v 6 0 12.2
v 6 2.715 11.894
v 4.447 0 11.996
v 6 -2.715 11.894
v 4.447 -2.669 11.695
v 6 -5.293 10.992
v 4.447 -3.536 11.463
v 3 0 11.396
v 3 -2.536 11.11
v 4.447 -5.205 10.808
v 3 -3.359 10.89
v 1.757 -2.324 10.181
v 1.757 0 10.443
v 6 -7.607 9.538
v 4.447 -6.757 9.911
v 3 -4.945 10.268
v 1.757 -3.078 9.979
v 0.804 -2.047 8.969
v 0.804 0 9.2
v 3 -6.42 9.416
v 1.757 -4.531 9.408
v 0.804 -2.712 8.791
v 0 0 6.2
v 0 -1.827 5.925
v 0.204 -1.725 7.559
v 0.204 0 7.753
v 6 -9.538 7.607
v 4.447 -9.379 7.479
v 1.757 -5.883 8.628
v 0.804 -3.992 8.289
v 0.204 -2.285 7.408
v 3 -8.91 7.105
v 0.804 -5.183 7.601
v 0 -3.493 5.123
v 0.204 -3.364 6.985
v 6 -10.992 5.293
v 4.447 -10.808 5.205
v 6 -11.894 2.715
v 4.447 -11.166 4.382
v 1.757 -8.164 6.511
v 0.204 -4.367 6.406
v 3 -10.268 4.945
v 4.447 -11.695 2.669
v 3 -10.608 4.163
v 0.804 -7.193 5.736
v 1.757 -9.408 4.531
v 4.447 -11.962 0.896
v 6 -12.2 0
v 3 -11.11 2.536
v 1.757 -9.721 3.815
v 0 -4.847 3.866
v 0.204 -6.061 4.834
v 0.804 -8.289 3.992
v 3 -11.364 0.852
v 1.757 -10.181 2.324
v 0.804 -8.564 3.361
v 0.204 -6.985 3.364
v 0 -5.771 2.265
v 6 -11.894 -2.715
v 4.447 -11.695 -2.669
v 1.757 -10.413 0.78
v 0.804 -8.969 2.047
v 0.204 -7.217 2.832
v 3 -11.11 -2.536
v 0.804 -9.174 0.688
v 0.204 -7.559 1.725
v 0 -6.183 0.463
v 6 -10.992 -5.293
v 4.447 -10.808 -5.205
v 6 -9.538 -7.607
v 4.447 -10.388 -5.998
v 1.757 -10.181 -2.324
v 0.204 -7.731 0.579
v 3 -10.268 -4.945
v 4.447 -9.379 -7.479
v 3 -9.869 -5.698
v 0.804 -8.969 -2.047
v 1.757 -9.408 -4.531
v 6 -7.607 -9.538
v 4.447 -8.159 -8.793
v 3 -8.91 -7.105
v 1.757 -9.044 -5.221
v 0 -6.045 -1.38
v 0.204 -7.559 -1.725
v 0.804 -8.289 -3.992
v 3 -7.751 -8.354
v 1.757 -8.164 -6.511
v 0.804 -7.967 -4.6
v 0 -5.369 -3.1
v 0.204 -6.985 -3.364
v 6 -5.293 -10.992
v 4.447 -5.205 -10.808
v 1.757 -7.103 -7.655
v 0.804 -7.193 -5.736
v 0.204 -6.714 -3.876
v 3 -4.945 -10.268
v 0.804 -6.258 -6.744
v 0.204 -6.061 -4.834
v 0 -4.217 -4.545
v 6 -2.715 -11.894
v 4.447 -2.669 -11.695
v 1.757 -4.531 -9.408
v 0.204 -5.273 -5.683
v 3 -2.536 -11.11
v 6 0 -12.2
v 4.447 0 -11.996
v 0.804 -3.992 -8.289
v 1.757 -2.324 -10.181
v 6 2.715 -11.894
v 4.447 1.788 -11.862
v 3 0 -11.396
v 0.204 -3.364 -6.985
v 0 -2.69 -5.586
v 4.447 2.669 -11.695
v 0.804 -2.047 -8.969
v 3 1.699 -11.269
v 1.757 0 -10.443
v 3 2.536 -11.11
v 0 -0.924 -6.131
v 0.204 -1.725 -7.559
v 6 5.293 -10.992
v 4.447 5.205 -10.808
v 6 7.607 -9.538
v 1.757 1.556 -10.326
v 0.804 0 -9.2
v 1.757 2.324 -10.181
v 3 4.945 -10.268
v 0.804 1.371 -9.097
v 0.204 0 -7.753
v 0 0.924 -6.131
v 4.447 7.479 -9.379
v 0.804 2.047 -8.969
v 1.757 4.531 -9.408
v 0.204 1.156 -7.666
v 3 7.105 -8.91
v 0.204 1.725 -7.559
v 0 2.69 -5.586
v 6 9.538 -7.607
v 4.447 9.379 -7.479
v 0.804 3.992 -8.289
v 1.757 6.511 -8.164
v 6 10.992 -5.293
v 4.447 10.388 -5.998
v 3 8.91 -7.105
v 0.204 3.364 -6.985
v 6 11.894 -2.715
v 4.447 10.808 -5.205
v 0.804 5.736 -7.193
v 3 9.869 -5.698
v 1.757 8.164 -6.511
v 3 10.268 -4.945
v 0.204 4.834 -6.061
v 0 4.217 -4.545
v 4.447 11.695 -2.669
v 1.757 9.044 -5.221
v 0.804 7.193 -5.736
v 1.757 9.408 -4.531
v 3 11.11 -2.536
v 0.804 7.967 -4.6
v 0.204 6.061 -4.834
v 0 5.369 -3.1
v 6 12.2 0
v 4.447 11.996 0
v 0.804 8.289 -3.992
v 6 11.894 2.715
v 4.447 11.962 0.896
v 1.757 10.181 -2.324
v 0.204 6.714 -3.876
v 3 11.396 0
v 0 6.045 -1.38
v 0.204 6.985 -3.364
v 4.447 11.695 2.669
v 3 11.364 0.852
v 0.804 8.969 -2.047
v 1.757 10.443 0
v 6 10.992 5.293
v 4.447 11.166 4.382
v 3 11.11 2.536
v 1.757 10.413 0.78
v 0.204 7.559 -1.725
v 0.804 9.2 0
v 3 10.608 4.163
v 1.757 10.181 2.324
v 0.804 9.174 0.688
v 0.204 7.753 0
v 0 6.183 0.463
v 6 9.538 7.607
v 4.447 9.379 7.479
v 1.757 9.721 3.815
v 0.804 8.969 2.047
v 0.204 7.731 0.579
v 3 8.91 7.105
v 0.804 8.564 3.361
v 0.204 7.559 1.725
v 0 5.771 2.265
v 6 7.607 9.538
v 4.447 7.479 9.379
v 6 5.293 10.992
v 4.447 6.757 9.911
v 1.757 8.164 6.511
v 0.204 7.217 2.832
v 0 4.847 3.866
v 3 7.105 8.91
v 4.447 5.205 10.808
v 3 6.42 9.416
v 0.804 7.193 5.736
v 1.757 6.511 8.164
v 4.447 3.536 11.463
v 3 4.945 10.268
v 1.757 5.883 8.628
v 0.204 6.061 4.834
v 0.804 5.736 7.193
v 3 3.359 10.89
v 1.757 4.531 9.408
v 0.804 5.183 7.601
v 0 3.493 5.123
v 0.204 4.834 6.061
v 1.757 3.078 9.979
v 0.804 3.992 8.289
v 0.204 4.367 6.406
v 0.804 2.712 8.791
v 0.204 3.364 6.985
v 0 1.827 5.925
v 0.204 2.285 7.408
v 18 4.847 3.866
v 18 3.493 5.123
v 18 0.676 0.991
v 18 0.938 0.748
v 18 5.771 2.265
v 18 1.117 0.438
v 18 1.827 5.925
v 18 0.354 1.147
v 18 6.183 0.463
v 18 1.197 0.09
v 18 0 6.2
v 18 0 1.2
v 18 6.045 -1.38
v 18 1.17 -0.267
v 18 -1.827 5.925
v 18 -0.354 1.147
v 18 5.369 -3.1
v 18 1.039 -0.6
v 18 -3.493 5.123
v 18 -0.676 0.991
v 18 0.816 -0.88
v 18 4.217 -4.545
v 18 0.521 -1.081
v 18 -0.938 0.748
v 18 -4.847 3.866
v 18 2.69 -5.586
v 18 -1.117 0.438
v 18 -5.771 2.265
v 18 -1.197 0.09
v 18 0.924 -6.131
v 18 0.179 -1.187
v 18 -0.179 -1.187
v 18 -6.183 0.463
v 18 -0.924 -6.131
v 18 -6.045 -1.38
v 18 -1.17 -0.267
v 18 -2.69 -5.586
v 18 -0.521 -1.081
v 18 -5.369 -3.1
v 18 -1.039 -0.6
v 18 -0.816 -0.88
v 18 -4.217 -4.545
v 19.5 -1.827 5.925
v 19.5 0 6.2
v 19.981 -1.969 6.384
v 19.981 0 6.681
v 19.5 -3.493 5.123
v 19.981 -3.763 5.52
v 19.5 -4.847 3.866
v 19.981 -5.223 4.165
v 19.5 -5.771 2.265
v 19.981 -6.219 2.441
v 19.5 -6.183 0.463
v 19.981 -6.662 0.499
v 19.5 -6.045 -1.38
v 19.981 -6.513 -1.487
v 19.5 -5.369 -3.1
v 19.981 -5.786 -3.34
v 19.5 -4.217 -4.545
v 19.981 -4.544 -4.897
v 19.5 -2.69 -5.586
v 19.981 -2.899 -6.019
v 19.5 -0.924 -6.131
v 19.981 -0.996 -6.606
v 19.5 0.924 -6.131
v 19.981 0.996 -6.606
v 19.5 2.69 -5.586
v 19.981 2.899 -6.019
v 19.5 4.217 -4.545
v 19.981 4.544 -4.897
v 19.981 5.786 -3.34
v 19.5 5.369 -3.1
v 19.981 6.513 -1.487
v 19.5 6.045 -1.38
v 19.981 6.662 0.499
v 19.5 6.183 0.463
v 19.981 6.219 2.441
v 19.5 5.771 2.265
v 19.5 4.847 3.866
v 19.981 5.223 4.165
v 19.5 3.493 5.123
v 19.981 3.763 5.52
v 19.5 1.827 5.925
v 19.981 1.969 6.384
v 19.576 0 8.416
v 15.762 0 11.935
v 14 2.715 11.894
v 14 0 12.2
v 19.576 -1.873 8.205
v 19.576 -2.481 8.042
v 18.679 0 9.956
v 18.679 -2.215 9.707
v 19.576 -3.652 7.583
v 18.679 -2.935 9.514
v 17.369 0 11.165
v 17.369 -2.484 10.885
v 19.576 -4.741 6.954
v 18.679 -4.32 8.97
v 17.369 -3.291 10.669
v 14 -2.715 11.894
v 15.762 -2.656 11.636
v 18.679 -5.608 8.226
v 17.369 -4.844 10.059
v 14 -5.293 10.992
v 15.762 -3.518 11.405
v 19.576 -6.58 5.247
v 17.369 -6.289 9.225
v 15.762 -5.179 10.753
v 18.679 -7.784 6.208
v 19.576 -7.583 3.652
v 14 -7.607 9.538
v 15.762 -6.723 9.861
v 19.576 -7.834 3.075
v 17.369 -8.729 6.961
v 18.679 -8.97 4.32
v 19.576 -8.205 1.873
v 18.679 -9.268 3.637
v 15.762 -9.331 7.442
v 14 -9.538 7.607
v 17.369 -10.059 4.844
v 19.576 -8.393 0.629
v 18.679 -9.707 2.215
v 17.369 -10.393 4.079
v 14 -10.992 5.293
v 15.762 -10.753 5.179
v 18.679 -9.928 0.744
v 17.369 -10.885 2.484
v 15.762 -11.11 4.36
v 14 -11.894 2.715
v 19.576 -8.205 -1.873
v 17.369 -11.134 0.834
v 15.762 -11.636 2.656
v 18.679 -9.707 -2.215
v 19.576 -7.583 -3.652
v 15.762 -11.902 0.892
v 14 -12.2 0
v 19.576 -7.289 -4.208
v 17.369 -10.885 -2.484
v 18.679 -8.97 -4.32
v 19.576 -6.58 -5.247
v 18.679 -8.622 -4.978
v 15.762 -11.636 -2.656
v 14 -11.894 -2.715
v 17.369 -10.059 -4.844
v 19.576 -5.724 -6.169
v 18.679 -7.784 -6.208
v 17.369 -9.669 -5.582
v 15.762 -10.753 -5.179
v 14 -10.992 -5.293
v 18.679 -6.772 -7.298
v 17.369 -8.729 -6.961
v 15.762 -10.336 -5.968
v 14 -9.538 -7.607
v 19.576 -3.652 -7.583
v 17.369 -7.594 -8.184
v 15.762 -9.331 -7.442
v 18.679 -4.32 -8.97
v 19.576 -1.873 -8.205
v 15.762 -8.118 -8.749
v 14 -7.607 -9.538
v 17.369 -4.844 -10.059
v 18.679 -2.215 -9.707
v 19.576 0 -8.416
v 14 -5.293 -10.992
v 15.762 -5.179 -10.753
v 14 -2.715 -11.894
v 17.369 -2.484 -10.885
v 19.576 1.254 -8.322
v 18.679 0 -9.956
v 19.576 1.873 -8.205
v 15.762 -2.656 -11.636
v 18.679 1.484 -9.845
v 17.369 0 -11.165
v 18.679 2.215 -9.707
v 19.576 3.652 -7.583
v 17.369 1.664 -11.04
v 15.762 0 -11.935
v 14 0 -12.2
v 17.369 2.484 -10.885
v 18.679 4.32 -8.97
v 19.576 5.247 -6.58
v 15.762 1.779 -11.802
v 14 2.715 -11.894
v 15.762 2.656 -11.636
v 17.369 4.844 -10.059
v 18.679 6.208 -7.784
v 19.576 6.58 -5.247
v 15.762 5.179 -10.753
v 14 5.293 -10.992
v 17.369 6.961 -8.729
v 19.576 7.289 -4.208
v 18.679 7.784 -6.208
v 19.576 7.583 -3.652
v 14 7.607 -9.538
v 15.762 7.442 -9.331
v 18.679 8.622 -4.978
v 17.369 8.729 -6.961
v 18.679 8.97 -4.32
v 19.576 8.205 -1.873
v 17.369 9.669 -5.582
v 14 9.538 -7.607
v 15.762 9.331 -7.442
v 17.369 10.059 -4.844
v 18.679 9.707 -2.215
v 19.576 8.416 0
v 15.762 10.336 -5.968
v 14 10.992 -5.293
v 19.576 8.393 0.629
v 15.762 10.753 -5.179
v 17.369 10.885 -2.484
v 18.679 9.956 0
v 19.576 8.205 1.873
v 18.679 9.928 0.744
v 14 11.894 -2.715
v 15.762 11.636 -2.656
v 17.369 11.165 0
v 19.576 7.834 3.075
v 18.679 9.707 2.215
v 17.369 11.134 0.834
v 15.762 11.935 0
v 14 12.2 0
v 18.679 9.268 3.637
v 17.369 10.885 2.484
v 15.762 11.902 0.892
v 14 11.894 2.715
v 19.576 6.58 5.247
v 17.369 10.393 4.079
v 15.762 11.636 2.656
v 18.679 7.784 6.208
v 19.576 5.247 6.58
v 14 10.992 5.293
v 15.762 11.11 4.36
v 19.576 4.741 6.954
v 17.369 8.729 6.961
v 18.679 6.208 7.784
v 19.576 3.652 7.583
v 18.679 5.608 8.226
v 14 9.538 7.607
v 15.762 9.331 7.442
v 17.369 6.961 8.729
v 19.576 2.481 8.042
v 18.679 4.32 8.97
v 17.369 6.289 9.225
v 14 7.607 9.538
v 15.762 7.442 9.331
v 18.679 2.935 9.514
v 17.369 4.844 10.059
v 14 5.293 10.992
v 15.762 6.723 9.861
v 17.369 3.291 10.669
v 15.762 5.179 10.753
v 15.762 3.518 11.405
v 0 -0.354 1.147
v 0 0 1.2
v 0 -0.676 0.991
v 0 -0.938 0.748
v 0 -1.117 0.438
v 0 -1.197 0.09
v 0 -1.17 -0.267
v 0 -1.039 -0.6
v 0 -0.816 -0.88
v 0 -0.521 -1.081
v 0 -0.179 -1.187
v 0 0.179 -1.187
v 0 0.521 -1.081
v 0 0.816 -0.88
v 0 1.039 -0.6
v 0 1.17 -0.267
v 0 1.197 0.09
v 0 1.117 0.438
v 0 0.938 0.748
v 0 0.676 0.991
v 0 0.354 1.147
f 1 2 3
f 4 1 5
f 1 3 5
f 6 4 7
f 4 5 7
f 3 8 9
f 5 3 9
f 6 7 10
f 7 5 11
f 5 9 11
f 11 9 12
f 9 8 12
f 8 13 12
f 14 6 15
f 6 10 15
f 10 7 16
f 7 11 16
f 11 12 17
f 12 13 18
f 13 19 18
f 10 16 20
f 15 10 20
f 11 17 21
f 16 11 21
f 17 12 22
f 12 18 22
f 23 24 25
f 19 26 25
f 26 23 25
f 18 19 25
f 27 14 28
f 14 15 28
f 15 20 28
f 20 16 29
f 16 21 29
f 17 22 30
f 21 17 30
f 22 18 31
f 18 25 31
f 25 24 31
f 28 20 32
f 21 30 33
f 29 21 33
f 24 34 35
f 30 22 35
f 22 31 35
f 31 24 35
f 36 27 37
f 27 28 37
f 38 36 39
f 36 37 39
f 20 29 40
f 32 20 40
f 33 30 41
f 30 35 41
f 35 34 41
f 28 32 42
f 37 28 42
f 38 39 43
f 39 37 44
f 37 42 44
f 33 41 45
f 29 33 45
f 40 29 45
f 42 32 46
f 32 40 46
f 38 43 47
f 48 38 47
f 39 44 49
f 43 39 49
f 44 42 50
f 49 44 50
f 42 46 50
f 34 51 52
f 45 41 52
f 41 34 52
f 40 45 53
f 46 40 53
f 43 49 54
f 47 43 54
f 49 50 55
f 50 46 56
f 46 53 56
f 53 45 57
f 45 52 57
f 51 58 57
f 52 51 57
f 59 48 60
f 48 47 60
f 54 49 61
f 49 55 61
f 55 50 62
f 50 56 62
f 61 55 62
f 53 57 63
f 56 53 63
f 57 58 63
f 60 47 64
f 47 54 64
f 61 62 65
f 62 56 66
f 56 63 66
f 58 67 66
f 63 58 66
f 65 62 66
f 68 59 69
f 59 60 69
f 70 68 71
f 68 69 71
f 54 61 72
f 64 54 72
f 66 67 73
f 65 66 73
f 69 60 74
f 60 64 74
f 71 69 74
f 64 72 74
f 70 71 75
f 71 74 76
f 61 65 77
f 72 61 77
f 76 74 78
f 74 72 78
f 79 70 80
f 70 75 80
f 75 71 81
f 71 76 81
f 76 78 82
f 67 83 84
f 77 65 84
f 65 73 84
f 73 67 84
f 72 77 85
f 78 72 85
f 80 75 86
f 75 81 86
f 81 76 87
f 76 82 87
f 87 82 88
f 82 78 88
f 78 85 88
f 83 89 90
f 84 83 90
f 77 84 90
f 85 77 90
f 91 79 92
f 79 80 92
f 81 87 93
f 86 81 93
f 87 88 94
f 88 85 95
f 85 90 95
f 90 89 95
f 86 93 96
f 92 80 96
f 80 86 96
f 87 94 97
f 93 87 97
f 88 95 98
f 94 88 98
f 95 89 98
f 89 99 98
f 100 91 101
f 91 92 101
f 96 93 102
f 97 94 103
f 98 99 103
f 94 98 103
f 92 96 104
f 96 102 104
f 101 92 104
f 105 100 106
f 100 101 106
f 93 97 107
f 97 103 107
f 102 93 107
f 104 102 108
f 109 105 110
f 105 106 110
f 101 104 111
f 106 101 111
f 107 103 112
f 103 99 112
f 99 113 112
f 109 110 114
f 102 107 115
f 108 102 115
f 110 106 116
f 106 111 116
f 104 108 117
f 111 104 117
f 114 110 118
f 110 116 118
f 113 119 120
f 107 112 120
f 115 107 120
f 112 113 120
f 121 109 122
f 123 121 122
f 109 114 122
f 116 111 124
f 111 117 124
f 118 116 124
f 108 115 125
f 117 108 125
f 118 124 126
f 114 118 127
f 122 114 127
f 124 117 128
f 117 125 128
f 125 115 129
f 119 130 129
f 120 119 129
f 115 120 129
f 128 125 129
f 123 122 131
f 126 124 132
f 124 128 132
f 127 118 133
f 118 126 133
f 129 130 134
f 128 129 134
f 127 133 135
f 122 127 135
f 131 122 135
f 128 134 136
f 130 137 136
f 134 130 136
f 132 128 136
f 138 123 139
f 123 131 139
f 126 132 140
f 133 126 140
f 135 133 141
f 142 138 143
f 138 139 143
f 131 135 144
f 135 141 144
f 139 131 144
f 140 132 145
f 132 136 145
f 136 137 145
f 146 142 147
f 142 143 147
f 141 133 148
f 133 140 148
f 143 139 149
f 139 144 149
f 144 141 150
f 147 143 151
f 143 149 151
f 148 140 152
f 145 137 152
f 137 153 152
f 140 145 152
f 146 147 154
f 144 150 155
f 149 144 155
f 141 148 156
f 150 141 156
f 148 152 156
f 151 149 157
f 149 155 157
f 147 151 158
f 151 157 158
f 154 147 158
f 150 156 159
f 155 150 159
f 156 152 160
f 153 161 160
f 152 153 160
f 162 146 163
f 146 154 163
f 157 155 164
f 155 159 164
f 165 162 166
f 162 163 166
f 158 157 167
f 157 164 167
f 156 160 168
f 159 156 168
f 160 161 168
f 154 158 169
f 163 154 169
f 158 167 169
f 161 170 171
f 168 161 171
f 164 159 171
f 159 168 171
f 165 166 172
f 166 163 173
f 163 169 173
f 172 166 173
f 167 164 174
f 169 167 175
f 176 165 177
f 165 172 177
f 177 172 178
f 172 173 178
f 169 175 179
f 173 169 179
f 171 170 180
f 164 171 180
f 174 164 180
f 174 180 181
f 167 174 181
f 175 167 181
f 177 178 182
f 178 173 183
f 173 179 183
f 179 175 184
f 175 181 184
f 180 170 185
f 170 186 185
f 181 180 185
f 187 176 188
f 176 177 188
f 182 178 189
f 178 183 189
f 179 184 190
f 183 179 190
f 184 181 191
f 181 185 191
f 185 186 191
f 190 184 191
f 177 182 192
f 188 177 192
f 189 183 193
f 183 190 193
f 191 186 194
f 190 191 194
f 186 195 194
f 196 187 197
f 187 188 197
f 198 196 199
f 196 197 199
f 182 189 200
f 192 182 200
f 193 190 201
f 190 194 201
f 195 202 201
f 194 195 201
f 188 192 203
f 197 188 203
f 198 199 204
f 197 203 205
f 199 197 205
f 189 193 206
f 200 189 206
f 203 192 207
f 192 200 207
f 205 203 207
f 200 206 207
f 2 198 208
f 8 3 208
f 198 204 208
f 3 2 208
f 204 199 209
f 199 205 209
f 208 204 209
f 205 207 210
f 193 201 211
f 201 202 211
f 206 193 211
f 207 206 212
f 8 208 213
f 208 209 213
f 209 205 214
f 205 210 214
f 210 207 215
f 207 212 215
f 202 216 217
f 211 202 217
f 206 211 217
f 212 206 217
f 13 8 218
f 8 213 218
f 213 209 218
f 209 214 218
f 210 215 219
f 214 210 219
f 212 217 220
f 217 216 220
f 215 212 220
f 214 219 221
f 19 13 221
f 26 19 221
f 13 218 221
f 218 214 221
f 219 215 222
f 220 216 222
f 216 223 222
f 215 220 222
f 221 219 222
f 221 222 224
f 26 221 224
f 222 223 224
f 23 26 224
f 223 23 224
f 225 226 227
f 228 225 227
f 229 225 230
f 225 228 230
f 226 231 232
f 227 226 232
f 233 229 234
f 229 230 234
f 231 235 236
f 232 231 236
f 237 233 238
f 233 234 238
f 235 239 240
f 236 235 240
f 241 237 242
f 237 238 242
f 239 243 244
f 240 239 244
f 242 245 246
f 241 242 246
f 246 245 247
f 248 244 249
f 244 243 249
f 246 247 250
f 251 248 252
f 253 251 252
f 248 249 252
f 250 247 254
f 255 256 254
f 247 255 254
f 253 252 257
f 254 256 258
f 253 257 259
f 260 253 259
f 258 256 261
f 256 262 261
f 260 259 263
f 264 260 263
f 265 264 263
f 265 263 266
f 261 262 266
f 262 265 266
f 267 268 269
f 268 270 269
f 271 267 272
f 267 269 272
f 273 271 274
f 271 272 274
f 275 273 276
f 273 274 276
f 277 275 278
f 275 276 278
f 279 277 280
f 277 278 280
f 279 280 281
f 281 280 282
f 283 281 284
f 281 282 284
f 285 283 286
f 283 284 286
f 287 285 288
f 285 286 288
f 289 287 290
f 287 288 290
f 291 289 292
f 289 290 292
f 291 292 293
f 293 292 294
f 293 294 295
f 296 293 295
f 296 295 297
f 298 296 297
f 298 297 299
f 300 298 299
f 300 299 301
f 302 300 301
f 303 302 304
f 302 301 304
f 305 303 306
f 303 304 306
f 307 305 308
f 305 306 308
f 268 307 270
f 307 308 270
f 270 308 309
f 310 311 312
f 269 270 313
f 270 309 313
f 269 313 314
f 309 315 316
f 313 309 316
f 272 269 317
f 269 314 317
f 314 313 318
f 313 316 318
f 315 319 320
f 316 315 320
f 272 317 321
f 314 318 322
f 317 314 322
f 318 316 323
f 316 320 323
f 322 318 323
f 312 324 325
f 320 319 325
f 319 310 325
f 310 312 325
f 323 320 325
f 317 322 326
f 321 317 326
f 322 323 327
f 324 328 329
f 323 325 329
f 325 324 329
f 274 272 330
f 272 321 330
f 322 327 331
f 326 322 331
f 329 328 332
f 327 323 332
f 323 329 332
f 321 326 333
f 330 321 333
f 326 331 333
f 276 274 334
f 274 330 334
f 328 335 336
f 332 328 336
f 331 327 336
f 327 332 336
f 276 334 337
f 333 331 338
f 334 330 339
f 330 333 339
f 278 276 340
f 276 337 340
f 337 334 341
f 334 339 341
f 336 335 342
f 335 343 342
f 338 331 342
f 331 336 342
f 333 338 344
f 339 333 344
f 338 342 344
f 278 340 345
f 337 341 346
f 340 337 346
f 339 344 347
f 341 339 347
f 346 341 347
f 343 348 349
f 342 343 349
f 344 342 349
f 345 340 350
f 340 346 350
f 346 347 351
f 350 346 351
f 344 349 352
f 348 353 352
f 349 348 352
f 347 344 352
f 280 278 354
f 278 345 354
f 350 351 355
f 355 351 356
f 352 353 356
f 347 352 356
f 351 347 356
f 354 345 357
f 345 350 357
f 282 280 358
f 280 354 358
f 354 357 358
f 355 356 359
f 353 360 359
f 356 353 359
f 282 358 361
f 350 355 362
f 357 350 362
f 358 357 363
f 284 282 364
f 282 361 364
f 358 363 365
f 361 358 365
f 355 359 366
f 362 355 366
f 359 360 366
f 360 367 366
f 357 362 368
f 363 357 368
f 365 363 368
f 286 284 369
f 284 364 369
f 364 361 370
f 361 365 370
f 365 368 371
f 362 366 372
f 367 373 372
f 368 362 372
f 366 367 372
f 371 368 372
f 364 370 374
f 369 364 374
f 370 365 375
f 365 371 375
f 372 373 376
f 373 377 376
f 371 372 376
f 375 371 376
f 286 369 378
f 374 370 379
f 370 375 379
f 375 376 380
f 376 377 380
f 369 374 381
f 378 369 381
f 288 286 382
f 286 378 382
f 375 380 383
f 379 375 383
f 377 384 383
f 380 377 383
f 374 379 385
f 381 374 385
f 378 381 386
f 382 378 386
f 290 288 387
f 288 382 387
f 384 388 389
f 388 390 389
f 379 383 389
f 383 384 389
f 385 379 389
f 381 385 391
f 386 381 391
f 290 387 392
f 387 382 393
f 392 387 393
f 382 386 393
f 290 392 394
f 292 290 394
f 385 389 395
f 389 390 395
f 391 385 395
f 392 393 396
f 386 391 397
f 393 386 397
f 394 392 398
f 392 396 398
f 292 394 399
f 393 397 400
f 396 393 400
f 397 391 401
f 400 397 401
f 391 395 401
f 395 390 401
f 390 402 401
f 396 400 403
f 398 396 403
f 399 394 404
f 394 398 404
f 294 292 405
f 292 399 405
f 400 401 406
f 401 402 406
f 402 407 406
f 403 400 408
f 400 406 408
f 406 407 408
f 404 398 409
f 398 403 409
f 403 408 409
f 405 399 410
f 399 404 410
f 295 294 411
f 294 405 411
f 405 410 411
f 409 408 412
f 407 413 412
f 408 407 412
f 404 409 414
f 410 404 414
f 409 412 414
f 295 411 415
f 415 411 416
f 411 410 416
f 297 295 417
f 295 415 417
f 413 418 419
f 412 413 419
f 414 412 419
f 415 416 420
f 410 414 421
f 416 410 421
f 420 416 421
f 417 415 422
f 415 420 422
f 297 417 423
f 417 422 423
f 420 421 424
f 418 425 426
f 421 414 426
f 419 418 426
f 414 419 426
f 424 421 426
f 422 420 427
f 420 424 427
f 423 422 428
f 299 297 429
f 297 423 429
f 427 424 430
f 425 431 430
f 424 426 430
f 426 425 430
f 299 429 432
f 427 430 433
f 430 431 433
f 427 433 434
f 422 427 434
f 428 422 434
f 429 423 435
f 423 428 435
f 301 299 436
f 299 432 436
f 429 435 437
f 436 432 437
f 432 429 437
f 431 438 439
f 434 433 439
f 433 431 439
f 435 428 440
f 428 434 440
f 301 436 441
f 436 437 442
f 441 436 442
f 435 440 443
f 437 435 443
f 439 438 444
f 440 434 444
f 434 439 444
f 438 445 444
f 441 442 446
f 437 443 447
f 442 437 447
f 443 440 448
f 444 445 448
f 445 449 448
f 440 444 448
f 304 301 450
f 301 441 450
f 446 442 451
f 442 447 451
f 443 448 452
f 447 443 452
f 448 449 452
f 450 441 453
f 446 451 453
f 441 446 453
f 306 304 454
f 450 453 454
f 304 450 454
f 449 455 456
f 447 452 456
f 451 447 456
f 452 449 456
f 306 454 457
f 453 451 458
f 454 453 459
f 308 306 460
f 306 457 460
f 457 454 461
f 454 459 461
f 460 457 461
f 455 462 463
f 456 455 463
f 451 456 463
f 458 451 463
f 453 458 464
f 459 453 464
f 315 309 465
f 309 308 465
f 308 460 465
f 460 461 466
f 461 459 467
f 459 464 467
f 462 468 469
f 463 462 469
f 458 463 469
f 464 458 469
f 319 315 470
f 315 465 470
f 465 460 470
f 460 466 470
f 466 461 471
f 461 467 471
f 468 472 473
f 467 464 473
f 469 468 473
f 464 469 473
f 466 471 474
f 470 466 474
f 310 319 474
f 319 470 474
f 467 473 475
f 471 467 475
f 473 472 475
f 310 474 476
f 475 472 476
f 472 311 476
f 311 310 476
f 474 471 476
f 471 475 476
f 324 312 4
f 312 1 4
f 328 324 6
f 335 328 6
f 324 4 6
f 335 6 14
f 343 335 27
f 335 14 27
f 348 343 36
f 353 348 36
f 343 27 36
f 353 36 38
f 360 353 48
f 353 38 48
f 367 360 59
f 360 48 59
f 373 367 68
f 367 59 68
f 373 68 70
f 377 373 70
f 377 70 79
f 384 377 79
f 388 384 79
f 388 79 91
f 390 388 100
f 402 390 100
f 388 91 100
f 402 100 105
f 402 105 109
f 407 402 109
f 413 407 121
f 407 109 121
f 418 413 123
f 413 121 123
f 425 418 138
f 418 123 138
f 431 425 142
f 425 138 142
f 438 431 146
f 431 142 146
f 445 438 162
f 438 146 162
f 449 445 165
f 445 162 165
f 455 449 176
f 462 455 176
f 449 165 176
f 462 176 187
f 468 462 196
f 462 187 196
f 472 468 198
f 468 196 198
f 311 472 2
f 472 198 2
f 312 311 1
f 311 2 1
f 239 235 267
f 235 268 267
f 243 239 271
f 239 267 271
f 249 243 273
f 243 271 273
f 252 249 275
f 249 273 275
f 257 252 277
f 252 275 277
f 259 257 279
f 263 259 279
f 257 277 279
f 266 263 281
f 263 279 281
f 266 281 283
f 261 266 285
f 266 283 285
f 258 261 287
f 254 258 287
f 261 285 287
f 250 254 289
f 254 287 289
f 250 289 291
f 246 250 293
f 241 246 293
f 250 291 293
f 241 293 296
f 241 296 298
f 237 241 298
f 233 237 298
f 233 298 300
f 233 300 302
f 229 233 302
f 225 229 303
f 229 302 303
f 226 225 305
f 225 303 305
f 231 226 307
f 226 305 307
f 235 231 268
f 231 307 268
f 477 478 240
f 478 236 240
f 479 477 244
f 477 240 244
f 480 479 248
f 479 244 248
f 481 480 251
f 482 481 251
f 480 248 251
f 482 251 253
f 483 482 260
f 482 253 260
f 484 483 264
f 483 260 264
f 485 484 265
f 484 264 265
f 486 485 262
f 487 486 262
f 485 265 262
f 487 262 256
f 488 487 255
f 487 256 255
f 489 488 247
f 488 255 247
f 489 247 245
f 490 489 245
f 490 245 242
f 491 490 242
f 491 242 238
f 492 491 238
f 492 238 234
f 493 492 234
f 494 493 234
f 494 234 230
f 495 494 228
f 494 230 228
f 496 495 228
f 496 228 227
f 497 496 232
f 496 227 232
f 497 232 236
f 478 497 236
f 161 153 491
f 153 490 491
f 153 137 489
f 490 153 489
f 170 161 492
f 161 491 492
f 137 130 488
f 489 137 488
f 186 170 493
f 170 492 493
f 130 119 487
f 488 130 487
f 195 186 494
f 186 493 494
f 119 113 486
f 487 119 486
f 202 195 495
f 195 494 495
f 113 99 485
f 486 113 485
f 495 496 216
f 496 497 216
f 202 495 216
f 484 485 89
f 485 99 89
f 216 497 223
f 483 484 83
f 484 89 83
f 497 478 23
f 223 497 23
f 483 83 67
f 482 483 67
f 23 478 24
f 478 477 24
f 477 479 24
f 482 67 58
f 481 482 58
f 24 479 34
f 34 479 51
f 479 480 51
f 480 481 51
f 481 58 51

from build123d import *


with BuildPart() as part:
    # Sketch1 → Revolve1 (revolve)
    with BuildSketch(Plane(origin=(0, 0, 0), x_dir=(1, 0, 0), z_dir=(0, 1, 0)), mode=Mode.PRIVATE) as revolve1_sk:
        with BuildLine():
            Line((19.5, 6.2), (19.980711996, 6.680711996))
            ThreePointArc((19.980711996, 6.680711996), (18.069135536, 10.609323756), (14, 12.2))
            Line((14, 12.2), (6, 12.2))
            ThreePointArc((6, 12.2), (1.757359313, 10.442640687), (0, 6.2))
            Line((0, 6.2), (0, 1.2))
            Line((0, 1.2), (18, 1.2))
            Line((18, 1.2), (18, 6.2))
            Line((18, 6.2), (19.5, 6.2))
        make_face()
    revolve(revolve1_sk.sketch.rotate(Axis((0, 0, 0), (1, 0, 0)), 180), axis=Axis((0, 0, 0), (1, 0, 0)))


solid = part.part
